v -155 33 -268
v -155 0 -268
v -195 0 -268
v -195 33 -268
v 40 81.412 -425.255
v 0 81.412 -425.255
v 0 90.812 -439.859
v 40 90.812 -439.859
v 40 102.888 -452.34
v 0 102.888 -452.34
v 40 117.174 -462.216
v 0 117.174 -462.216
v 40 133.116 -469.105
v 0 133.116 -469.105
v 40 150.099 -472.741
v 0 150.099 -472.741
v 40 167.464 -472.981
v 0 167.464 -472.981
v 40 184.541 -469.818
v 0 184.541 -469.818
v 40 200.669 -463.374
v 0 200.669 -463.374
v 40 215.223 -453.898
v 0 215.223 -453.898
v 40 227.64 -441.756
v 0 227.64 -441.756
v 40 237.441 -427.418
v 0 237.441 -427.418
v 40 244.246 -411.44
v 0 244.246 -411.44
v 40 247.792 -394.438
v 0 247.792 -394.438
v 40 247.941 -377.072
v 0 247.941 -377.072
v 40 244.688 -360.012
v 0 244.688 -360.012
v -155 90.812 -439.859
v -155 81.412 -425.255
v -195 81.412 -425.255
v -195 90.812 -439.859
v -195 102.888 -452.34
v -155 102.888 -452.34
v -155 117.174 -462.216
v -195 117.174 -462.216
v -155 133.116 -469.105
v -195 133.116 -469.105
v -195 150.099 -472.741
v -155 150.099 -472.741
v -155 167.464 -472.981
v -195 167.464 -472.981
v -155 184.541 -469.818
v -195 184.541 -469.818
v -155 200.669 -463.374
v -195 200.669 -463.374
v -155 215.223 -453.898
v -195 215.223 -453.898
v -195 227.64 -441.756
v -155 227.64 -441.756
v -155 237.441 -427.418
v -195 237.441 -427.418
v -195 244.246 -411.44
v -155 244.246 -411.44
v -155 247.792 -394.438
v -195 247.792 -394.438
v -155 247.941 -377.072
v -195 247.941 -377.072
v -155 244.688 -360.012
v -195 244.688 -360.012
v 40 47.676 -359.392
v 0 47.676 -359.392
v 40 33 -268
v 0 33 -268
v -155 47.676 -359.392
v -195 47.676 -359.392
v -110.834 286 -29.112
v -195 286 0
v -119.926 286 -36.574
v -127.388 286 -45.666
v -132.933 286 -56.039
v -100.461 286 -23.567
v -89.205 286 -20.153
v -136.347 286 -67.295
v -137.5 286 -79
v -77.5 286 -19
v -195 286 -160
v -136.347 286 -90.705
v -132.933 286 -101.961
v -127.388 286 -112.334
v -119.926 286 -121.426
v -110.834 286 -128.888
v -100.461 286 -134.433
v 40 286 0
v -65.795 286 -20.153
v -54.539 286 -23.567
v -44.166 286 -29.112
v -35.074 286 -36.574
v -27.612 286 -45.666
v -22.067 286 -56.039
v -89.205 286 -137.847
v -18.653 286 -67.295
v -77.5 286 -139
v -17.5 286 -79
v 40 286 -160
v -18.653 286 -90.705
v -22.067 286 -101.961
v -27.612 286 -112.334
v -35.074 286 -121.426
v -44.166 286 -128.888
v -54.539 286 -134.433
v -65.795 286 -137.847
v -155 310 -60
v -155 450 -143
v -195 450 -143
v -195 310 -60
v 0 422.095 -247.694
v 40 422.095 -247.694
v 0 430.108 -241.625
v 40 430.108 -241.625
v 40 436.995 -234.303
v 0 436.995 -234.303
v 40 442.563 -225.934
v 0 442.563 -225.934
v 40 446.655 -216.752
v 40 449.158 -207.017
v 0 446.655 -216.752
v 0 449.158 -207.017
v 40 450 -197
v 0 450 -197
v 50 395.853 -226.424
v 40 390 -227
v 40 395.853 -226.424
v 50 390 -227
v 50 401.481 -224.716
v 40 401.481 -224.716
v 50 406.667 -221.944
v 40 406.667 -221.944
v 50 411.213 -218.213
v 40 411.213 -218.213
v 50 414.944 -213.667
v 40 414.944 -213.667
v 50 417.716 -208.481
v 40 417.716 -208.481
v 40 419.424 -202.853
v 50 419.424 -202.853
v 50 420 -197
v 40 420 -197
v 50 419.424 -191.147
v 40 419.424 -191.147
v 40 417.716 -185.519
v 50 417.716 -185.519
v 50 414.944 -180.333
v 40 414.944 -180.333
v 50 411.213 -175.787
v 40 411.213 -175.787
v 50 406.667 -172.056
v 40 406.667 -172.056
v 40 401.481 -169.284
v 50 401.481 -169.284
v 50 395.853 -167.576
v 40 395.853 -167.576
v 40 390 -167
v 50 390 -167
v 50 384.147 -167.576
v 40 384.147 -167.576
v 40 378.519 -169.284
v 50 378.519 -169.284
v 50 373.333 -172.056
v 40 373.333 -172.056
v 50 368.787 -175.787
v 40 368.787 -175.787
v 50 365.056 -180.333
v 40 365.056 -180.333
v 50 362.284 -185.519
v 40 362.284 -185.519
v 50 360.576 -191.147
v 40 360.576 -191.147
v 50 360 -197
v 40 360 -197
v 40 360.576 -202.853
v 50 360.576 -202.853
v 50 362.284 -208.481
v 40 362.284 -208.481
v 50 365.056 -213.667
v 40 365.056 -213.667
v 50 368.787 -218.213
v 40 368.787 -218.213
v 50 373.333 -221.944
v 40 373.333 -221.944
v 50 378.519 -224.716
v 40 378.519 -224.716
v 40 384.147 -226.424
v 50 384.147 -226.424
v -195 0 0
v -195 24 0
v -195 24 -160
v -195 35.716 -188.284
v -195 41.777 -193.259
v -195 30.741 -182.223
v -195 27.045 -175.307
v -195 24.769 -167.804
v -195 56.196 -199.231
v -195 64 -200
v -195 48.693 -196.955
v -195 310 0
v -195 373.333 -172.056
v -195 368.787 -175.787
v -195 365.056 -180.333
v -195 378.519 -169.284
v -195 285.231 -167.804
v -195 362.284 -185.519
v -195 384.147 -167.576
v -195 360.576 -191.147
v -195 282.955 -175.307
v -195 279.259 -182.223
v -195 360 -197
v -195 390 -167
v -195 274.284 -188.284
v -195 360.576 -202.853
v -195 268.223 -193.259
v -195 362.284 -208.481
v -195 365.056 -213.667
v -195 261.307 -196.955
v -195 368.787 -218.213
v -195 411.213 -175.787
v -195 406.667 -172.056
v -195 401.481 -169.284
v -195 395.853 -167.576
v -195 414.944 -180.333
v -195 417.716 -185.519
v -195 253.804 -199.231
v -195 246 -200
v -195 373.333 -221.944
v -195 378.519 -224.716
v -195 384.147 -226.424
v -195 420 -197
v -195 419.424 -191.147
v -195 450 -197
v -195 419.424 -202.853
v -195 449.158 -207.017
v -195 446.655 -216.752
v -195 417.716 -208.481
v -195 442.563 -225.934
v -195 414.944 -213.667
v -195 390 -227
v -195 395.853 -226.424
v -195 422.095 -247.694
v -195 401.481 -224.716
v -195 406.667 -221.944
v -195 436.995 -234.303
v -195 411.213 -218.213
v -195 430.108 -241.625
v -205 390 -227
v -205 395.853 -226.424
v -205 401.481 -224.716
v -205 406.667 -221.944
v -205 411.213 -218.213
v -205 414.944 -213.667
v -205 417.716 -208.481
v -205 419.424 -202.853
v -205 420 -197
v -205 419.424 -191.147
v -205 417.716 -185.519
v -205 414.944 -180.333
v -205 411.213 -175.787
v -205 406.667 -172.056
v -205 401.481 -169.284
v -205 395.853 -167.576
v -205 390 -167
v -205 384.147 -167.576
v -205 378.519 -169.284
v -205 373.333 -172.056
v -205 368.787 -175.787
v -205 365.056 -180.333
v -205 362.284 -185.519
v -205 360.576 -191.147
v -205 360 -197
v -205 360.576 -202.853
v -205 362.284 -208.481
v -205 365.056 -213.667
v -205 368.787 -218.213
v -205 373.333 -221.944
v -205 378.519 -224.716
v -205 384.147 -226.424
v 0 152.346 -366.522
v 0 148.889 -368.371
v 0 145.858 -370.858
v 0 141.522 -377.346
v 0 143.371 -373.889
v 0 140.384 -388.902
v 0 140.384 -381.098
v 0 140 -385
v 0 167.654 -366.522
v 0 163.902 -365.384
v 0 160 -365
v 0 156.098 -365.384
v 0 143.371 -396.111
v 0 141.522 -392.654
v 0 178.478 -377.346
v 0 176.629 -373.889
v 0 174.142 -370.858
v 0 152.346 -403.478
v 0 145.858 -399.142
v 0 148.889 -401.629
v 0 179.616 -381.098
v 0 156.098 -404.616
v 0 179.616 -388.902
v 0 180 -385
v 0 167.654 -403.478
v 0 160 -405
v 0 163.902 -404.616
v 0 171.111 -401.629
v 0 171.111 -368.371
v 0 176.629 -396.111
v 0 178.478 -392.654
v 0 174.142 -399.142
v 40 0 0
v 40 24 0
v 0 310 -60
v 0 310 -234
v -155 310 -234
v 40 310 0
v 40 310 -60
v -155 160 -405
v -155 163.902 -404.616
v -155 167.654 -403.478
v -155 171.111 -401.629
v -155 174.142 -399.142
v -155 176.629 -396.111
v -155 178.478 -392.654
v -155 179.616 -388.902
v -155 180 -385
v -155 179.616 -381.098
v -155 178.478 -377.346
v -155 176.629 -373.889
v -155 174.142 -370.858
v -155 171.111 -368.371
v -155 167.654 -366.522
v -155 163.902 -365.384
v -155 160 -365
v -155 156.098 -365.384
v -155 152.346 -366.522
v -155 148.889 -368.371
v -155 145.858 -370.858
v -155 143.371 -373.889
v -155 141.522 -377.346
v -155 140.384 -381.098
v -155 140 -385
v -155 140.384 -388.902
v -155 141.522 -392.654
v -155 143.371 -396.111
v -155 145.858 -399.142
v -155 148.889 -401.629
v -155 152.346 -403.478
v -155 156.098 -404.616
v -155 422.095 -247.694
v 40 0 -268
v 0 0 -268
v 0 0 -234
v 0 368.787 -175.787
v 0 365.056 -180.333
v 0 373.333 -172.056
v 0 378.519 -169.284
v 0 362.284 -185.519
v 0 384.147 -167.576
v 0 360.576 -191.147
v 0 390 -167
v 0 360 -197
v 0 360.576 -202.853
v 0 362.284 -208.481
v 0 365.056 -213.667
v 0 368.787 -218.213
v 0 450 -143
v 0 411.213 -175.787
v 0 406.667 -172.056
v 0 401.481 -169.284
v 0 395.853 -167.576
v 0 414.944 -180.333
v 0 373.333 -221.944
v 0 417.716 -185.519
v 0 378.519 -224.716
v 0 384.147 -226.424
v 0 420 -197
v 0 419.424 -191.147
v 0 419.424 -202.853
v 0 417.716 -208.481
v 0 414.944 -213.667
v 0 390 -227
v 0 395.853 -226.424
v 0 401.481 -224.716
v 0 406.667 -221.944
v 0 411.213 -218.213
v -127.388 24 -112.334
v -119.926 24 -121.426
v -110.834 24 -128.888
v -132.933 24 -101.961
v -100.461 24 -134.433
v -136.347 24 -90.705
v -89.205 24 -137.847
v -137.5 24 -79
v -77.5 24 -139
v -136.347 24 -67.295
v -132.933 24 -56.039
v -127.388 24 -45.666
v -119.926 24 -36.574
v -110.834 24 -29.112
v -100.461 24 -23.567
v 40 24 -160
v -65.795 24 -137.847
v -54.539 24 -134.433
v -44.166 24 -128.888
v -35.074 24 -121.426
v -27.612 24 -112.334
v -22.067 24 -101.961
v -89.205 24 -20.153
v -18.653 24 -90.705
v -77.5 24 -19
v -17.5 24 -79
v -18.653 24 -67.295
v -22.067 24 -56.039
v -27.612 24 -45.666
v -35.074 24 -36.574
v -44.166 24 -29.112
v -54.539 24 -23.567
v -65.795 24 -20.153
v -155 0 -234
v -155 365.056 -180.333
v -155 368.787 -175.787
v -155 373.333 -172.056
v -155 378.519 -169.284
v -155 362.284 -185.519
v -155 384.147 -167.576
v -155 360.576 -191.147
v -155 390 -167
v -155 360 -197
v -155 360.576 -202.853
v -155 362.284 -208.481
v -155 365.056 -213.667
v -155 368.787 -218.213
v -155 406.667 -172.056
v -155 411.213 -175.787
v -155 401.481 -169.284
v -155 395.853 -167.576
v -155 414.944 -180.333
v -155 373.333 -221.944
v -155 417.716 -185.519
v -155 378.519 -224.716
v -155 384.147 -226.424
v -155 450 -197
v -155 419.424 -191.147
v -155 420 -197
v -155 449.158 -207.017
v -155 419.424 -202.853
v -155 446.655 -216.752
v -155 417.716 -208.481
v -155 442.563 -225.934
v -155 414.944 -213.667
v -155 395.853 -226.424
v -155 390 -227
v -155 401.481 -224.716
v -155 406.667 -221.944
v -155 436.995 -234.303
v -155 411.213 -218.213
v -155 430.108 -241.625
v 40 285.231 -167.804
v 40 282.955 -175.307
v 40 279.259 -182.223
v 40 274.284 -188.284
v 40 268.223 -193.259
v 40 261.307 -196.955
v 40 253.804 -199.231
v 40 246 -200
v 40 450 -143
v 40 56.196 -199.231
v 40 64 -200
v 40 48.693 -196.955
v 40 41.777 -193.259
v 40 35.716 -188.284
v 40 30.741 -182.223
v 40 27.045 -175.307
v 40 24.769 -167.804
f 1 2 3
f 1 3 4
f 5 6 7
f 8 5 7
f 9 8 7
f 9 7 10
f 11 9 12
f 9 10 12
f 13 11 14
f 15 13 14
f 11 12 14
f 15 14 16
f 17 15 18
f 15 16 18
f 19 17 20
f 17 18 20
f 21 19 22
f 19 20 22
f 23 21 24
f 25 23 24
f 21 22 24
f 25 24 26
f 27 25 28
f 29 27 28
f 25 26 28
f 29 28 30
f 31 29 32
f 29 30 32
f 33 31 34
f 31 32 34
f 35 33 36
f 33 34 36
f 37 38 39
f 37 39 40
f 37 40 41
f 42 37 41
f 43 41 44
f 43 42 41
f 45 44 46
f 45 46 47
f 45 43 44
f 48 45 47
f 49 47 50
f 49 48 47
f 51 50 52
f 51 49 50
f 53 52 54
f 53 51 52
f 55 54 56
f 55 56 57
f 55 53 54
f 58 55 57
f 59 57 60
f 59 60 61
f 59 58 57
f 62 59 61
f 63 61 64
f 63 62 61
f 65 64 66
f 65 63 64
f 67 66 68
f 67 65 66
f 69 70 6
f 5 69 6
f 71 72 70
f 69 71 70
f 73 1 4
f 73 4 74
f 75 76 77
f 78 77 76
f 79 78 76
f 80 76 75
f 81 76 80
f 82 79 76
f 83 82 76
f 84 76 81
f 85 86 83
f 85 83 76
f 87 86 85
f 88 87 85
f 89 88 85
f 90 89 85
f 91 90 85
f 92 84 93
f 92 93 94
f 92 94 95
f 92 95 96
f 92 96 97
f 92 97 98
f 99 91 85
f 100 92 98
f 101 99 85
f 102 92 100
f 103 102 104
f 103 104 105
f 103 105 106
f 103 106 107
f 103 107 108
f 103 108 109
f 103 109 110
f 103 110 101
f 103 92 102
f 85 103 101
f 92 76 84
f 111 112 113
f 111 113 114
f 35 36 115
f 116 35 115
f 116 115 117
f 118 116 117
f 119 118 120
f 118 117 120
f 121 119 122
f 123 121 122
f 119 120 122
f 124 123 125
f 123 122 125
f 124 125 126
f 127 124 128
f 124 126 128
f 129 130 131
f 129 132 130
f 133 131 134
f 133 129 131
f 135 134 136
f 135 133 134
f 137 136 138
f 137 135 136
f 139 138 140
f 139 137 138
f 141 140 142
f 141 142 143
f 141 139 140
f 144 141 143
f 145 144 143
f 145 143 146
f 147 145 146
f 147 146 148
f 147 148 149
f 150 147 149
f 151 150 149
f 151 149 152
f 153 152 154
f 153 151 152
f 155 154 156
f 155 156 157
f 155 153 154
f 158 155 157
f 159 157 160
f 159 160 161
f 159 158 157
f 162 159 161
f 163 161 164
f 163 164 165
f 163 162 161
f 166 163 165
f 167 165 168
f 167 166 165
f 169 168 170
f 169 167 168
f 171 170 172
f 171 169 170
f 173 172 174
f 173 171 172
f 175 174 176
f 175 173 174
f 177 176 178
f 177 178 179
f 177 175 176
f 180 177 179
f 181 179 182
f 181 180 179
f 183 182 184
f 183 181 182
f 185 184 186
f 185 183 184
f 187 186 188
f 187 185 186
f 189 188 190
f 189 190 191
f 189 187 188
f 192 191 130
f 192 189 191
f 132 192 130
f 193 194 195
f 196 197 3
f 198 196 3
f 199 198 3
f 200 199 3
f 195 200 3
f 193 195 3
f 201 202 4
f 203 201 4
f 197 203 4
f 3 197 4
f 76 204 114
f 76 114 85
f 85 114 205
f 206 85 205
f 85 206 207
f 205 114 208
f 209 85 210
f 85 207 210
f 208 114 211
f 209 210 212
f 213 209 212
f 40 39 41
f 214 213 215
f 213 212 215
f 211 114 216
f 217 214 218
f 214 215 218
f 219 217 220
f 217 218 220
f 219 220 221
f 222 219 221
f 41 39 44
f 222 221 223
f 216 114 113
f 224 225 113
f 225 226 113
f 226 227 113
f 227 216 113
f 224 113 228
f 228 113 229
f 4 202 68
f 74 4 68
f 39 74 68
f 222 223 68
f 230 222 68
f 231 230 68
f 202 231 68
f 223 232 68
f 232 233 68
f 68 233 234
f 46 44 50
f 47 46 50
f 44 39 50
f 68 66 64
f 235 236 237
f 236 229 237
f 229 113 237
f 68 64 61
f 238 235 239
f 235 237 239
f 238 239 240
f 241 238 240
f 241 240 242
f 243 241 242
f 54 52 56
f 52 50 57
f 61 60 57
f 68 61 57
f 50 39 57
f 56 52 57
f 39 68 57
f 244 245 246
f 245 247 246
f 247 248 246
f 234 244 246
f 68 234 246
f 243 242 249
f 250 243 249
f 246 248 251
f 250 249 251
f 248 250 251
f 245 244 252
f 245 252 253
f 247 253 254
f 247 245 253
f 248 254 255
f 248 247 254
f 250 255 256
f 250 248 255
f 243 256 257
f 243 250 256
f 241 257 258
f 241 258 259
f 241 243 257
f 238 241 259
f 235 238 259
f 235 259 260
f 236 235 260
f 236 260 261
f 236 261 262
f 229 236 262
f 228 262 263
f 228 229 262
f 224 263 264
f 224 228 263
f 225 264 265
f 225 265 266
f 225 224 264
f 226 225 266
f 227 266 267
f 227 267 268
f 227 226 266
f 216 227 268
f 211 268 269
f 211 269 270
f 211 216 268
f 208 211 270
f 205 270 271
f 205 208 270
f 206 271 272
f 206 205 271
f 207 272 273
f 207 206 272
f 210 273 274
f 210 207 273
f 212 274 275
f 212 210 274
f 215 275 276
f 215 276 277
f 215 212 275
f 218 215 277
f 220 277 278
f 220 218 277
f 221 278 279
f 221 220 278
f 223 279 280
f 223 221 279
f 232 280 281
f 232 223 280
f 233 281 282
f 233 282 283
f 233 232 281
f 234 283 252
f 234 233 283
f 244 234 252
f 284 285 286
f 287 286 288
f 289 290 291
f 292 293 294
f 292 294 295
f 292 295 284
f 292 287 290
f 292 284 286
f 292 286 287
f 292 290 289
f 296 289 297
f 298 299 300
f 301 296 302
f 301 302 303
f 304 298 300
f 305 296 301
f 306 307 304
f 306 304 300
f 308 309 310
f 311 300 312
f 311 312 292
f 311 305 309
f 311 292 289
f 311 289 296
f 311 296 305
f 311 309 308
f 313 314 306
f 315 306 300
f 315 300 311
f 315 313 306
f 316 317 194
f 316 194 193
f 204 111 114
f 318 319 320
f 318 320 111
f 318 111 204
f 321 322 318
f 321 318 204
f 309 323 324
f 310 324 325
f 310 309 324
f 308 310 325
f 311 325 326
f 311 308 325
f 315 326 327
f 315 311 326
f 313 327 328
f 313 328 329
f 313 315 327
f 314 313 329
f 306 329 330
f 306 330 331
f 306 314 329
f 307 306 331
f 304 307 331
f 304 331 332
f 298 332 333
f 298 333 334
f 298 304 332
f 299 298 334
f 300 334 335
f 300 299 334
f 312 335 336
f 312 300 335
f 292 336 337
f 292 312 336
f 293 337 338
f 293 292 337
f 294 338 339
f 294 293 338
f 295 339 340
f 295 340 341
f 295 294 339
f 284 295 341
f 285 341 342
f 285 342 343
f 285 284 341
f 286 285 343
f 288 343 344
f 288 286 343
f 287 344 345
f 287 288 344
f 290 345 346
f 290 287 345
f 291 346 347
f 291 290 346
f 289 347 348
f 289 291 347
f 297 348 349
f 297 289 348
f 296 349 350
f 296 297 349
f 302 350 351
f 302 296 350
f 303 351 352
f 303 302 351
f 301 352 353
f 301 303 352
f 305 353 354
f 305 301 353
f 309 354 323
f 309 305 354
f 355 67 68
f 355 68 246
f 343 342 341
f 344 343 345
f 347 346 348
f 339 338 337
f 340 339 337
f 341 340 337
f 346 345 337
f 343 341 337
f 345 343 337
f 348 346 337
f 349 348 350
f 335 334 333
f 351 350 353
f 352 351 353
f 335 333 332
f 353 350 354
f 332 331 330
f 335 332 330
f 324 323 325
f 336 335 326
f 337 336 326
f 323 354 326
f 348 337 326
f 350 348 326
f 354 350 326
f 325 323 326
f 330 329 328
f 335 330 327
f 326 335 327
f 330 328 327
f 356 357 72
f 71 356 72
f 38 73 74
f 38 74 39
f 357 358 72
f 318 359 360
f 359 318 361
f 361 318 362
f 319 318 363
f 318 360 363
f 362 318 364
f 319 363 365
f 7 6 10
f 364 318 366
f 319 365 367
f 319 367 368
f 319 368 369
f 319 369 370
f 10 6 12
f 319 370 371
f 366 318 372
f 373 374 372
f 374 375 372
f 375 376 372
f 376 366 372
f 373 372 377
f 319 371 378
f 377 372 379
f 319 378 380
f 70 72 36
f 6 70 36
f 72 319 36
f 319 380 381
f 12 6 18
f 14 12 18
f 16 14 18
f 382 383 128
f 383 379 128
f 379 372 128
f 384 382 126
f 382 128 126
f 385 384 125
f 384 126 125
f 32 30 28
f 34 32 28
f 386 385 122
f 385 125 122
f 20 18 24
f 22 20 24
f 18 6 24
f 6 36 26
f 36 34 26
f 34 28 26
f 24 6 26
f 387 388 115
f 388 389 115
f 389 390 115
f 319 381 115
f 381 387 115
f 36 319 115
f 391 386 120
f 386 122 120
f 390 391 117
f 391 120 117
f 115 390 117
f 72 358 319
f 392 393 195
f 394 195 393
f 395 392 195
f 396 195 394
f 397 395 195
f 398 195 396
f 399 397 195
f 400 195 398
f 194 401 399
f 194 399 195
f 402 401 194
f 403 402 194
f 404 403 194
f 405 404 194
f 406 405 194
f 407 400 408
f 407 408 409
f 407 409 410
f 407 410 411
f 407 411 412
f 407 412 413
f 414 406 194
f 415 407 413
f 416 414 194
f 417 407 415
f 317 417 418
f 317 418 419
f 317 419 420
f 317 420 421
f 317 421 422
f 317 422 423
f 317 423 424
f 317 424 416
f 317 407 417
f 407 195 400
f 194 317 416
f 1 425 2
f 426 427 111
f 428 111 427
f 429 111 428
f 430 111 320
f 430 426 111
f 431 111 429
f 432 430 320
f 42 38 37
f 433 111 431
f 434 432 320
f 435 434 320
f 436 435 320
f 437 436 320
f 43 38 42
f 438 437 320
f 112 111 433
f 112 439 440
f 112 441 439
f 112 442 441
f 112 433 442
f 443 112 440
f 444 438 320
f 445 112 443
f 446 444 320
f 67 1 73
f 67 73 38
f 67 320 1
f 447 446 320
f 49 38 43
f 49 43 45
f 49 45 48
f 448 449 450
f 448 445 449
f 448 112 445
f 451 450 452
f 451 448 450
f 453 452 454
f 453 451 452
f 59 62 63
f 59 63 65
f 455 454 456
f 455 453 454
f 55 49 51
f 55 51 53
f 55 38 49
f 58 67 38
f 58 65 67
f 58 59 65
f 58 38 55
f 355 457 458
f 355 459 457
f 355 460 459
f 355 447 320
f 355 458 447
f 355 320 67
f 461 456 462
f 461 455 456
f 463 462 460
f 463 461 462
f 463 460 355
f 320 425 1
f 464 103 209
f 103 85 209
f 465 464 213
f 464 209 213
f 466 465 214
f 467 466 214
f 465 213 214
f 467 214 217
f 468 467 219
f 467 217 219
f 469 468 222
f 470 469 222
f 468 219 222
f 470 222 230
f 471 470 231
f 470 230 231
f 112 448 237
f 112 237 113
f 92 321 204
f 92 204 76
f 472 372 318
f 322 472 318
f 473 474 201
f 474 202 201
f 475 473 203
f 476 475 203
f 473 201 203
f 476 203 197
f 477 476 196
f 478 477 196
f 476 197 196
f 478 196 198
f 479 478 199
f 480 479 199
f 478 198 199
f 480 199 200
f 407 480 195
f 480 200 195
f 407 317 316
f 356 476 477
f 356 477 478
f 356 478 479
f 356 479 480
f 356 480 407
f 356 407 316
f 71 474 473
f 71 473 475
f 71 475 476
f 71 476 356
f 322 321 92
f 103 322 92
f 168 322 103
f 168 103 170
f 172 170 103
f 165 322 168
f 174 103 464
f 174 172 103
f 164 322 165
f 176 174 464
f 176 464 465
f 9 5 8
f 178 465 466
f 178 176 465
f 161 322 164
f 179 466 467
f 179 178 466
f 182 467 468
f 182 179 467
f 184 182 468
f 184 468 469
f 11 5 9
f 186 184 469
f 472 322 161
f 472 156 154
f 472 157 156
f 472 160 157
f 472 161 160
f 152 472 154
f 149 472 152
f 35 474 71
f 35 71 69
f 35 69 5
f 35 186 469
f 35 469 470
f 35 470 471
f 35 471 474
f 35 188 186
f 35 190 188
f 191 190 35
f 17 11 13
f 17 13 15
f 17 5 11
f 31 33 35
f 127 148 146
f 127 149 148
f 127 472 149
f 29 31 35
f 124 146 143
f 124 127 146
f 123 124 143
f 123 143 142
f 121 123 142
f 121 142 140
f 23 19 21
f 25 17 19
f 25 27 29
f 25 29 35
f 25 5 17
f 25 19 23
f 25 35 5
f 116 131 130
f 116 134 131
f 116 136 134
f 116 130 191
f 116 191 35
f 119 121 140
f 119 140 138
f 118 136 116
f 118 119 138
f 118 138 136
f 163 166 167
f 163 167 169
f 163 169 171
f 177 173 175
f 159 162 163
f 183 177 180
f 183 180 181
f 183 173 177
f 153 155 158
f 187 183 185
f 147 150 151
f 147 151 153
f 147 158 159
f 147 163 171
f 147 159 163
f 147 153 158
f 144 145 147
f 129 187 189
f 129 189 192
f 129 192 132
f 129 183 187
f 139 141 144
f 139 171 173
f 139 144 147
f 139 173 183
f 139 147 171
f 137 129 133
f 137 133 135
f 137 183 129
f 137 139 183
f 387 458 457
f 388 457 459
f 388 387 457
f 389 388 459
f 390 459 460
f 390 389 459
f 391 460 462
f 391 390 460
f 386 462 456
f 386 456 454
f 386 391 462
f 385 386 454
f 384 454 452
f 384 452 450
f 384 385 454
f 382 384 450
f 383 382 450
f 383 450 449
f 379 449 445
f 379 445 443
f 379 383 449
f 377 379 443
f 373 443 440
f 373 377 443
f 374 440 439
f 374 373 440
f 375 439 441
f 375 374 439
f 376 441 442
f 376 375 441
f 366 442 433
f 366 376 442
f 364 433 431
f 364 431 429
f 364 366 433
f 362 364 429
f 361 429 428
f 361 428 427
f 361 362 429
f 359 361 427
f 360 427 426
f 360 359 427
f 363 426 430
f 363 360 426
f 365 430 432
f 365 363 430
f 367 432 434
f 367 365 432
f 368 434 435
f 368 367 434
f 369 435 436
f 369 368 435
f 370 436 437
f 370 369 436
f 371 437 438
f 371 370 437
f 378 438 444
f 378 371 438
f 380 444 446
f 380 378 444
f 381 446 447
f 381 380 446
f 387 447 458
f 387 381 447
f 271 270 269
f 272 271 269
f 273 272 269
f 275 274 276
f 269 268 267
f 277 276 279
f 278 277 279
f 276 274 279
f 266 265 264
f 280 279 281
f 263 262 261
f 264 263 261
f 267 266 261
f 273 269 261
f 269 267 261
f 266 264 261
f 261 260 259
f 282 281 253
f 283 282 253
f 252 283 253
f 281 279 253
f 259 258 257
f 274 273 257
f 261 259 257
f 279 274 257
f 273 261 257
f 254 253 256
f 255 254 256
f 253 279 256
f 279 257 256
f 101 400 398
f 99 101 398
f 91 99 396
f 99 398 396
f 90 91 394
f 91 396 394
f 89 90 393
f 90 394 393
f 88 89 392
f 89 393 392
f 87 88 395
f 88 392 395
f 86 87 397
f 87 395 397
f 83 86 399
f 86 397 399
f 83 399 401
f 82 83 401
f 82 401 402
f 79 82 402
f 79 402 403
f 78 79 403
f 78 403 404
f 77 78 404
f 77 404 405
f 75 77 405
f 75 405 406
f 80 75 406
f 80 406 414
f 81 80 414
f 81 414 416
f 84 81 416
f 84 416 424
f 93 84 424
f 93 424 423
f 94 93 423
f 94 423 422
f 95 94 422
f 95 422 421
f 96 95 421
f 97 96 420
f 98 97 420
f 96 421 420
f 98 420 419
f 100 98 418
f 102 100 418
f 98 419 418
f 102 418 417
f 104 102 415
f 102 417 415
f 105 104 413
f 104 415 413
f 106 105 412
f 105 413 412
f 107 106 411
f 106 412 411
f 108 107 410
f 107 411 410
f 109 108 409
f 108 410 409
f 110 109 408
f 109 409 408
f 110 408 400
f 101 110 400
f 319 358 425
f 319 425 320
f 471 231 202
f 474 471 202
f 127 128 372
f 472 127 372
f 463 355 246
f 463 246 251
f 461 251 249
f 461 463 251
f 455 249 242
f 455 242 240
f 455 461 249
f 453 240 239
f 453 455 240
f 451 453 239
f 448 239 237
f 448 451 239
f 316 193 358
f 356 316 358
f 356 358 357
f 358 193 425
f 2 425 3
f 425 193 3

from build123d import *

# Parameters (mm, degrees)
SKETCH1_R           = 30
BOSS_EXTRUDE1_DEPTH = 40
BOSS_EXTRUDE2_DEPTH = 77.5
FILLET1_R           = 40
SKETCH3_R           = 30
BOSS_EXTRUDE3_DEPTH = 127.5
SKETCH4_R           = 20
BOSS_EXTRUDE4_DEPTH = 77.5
SKETCH5_R           = 60
BOSS_EXTRUDE5_DEPTH = 286


with BuildPart() as part:
    # Sketch1 → Boss-Extrude1 (new body)
    with BuildSketch(Plane(origin=(0, 0, 0), x_dir=(0, 0, -1), z_dir=(1, 0, 0))):
        with BuildLine():
            Line((0, 0), (268, 0))
            Line((268, 0), (268, 33))
            Line((268, 33), (359.392375101, 47.67597271))
            Line((359.392375101, 47.67597271), (425.254709277, 81.41249501))
            ThreePointArc((425.254709277, 81.41249501), (466.993732625, 192.763781371), (360.011718162, 244.687799182))
            Line((360.011718162, 244.687799182), (247.694370572, 422.094871744))
            ThreePointArc((247.694370572, 422.094871744), (225.933611038, 442.562782958), (197, 450))
            Line((197, 450), (143, 450))
            Line((143, 450), (60, 310))
            Line((60, 310), (0, 310))
            Line((0, 310), (0, 286))
            Line((0, 286), (200, 286))
            Line((200, 286), (200, 24))
            Line((200, 24), (0, 24))
            Line((0, 24), (0, 0))
        make_face()
        with Locations((197, 390)):
            Circle(SKETCH1_R, mode=Mode.SUBTRACT)
    extrude(amount=BOSS_EXTRUDE1_DEPTH)


with BuildPart() as body_2:
    # Mirror3: mirrored copy
    add(part.part.mirror(Plane(origin=(-77.5, 0, 0), x_dir=(0, 0, 1), z_dir=(1, 0, 0))))


with BuildPart() as part_1:
    add(part.part)

    add(body_2.part)  # Boss-Extrude2 merges body 2
    # Sketch2 → Boss-Extrude2 (add, symmetric)
    with BuildSketch(Plane(origin=(-77.5, 0, 0), x_dir=(0, 0, -1), z_dir=(1, 0, 0))):
        Polygon((0, 0), (234, 0), (234, 310), (0, 310), (0, 286), (200, 286), (200, 24), (0, 24), align=None)
    extrude(amount=BOSS_EXTRUDE2_DEPTH, both=True)

    # Fillet1
    fillet1_edges = [part_1.edges().sort_by_distance(p)[0] for p in [
        (-77.5, 24, -200),
        (-77.5, 286, -200),
    ]]
    fillet(fillet1_edges, radius=FILLET1_R)

    # Sketch3 → Boss-Extrude3 (add, symmetric)
    with BuildSketch(Plane(origin=(-77.5, 0, 0), x_dir=(0, 0, -1), z_dir=(1, 0, 0))):
        with Locations((197, 390)):
            Circle(SKETCH3_R)
    extrude(amount=BOSS_EXTRUDE3_DEPTH, both=True)

    # Sketch5 → Boss-Extrude5 (add)
    with BuildSketch(Plane(origin=(0, 0, 0), x_dir=(1, 0, 0), z_dir=(0, 1, 0))):
        with Locations(Location((-77.5, 79, 0), (0, 0, 90))):
            Circle(SKETCH5_R)
    extrude(amount=BOSS_EXTRUDE5_DEPTH)


with BuildPart() as body_2_2:
    # Sketch4 → Boss-Extrude4 (new, symmetric)
    with BuildSketch(Plane(origin=(-77.5, 0, 0), x_dir=(0, 0, -1), z_dir=(1, 0, 0))):
        with Locations((385, 160)):
            Circle(SKETCH4_R)
    extrude(amount=BOSS_EXTRUDE4_DEPTH, both=True)


solid = Compound([part_1.part, body_2_2.part])
